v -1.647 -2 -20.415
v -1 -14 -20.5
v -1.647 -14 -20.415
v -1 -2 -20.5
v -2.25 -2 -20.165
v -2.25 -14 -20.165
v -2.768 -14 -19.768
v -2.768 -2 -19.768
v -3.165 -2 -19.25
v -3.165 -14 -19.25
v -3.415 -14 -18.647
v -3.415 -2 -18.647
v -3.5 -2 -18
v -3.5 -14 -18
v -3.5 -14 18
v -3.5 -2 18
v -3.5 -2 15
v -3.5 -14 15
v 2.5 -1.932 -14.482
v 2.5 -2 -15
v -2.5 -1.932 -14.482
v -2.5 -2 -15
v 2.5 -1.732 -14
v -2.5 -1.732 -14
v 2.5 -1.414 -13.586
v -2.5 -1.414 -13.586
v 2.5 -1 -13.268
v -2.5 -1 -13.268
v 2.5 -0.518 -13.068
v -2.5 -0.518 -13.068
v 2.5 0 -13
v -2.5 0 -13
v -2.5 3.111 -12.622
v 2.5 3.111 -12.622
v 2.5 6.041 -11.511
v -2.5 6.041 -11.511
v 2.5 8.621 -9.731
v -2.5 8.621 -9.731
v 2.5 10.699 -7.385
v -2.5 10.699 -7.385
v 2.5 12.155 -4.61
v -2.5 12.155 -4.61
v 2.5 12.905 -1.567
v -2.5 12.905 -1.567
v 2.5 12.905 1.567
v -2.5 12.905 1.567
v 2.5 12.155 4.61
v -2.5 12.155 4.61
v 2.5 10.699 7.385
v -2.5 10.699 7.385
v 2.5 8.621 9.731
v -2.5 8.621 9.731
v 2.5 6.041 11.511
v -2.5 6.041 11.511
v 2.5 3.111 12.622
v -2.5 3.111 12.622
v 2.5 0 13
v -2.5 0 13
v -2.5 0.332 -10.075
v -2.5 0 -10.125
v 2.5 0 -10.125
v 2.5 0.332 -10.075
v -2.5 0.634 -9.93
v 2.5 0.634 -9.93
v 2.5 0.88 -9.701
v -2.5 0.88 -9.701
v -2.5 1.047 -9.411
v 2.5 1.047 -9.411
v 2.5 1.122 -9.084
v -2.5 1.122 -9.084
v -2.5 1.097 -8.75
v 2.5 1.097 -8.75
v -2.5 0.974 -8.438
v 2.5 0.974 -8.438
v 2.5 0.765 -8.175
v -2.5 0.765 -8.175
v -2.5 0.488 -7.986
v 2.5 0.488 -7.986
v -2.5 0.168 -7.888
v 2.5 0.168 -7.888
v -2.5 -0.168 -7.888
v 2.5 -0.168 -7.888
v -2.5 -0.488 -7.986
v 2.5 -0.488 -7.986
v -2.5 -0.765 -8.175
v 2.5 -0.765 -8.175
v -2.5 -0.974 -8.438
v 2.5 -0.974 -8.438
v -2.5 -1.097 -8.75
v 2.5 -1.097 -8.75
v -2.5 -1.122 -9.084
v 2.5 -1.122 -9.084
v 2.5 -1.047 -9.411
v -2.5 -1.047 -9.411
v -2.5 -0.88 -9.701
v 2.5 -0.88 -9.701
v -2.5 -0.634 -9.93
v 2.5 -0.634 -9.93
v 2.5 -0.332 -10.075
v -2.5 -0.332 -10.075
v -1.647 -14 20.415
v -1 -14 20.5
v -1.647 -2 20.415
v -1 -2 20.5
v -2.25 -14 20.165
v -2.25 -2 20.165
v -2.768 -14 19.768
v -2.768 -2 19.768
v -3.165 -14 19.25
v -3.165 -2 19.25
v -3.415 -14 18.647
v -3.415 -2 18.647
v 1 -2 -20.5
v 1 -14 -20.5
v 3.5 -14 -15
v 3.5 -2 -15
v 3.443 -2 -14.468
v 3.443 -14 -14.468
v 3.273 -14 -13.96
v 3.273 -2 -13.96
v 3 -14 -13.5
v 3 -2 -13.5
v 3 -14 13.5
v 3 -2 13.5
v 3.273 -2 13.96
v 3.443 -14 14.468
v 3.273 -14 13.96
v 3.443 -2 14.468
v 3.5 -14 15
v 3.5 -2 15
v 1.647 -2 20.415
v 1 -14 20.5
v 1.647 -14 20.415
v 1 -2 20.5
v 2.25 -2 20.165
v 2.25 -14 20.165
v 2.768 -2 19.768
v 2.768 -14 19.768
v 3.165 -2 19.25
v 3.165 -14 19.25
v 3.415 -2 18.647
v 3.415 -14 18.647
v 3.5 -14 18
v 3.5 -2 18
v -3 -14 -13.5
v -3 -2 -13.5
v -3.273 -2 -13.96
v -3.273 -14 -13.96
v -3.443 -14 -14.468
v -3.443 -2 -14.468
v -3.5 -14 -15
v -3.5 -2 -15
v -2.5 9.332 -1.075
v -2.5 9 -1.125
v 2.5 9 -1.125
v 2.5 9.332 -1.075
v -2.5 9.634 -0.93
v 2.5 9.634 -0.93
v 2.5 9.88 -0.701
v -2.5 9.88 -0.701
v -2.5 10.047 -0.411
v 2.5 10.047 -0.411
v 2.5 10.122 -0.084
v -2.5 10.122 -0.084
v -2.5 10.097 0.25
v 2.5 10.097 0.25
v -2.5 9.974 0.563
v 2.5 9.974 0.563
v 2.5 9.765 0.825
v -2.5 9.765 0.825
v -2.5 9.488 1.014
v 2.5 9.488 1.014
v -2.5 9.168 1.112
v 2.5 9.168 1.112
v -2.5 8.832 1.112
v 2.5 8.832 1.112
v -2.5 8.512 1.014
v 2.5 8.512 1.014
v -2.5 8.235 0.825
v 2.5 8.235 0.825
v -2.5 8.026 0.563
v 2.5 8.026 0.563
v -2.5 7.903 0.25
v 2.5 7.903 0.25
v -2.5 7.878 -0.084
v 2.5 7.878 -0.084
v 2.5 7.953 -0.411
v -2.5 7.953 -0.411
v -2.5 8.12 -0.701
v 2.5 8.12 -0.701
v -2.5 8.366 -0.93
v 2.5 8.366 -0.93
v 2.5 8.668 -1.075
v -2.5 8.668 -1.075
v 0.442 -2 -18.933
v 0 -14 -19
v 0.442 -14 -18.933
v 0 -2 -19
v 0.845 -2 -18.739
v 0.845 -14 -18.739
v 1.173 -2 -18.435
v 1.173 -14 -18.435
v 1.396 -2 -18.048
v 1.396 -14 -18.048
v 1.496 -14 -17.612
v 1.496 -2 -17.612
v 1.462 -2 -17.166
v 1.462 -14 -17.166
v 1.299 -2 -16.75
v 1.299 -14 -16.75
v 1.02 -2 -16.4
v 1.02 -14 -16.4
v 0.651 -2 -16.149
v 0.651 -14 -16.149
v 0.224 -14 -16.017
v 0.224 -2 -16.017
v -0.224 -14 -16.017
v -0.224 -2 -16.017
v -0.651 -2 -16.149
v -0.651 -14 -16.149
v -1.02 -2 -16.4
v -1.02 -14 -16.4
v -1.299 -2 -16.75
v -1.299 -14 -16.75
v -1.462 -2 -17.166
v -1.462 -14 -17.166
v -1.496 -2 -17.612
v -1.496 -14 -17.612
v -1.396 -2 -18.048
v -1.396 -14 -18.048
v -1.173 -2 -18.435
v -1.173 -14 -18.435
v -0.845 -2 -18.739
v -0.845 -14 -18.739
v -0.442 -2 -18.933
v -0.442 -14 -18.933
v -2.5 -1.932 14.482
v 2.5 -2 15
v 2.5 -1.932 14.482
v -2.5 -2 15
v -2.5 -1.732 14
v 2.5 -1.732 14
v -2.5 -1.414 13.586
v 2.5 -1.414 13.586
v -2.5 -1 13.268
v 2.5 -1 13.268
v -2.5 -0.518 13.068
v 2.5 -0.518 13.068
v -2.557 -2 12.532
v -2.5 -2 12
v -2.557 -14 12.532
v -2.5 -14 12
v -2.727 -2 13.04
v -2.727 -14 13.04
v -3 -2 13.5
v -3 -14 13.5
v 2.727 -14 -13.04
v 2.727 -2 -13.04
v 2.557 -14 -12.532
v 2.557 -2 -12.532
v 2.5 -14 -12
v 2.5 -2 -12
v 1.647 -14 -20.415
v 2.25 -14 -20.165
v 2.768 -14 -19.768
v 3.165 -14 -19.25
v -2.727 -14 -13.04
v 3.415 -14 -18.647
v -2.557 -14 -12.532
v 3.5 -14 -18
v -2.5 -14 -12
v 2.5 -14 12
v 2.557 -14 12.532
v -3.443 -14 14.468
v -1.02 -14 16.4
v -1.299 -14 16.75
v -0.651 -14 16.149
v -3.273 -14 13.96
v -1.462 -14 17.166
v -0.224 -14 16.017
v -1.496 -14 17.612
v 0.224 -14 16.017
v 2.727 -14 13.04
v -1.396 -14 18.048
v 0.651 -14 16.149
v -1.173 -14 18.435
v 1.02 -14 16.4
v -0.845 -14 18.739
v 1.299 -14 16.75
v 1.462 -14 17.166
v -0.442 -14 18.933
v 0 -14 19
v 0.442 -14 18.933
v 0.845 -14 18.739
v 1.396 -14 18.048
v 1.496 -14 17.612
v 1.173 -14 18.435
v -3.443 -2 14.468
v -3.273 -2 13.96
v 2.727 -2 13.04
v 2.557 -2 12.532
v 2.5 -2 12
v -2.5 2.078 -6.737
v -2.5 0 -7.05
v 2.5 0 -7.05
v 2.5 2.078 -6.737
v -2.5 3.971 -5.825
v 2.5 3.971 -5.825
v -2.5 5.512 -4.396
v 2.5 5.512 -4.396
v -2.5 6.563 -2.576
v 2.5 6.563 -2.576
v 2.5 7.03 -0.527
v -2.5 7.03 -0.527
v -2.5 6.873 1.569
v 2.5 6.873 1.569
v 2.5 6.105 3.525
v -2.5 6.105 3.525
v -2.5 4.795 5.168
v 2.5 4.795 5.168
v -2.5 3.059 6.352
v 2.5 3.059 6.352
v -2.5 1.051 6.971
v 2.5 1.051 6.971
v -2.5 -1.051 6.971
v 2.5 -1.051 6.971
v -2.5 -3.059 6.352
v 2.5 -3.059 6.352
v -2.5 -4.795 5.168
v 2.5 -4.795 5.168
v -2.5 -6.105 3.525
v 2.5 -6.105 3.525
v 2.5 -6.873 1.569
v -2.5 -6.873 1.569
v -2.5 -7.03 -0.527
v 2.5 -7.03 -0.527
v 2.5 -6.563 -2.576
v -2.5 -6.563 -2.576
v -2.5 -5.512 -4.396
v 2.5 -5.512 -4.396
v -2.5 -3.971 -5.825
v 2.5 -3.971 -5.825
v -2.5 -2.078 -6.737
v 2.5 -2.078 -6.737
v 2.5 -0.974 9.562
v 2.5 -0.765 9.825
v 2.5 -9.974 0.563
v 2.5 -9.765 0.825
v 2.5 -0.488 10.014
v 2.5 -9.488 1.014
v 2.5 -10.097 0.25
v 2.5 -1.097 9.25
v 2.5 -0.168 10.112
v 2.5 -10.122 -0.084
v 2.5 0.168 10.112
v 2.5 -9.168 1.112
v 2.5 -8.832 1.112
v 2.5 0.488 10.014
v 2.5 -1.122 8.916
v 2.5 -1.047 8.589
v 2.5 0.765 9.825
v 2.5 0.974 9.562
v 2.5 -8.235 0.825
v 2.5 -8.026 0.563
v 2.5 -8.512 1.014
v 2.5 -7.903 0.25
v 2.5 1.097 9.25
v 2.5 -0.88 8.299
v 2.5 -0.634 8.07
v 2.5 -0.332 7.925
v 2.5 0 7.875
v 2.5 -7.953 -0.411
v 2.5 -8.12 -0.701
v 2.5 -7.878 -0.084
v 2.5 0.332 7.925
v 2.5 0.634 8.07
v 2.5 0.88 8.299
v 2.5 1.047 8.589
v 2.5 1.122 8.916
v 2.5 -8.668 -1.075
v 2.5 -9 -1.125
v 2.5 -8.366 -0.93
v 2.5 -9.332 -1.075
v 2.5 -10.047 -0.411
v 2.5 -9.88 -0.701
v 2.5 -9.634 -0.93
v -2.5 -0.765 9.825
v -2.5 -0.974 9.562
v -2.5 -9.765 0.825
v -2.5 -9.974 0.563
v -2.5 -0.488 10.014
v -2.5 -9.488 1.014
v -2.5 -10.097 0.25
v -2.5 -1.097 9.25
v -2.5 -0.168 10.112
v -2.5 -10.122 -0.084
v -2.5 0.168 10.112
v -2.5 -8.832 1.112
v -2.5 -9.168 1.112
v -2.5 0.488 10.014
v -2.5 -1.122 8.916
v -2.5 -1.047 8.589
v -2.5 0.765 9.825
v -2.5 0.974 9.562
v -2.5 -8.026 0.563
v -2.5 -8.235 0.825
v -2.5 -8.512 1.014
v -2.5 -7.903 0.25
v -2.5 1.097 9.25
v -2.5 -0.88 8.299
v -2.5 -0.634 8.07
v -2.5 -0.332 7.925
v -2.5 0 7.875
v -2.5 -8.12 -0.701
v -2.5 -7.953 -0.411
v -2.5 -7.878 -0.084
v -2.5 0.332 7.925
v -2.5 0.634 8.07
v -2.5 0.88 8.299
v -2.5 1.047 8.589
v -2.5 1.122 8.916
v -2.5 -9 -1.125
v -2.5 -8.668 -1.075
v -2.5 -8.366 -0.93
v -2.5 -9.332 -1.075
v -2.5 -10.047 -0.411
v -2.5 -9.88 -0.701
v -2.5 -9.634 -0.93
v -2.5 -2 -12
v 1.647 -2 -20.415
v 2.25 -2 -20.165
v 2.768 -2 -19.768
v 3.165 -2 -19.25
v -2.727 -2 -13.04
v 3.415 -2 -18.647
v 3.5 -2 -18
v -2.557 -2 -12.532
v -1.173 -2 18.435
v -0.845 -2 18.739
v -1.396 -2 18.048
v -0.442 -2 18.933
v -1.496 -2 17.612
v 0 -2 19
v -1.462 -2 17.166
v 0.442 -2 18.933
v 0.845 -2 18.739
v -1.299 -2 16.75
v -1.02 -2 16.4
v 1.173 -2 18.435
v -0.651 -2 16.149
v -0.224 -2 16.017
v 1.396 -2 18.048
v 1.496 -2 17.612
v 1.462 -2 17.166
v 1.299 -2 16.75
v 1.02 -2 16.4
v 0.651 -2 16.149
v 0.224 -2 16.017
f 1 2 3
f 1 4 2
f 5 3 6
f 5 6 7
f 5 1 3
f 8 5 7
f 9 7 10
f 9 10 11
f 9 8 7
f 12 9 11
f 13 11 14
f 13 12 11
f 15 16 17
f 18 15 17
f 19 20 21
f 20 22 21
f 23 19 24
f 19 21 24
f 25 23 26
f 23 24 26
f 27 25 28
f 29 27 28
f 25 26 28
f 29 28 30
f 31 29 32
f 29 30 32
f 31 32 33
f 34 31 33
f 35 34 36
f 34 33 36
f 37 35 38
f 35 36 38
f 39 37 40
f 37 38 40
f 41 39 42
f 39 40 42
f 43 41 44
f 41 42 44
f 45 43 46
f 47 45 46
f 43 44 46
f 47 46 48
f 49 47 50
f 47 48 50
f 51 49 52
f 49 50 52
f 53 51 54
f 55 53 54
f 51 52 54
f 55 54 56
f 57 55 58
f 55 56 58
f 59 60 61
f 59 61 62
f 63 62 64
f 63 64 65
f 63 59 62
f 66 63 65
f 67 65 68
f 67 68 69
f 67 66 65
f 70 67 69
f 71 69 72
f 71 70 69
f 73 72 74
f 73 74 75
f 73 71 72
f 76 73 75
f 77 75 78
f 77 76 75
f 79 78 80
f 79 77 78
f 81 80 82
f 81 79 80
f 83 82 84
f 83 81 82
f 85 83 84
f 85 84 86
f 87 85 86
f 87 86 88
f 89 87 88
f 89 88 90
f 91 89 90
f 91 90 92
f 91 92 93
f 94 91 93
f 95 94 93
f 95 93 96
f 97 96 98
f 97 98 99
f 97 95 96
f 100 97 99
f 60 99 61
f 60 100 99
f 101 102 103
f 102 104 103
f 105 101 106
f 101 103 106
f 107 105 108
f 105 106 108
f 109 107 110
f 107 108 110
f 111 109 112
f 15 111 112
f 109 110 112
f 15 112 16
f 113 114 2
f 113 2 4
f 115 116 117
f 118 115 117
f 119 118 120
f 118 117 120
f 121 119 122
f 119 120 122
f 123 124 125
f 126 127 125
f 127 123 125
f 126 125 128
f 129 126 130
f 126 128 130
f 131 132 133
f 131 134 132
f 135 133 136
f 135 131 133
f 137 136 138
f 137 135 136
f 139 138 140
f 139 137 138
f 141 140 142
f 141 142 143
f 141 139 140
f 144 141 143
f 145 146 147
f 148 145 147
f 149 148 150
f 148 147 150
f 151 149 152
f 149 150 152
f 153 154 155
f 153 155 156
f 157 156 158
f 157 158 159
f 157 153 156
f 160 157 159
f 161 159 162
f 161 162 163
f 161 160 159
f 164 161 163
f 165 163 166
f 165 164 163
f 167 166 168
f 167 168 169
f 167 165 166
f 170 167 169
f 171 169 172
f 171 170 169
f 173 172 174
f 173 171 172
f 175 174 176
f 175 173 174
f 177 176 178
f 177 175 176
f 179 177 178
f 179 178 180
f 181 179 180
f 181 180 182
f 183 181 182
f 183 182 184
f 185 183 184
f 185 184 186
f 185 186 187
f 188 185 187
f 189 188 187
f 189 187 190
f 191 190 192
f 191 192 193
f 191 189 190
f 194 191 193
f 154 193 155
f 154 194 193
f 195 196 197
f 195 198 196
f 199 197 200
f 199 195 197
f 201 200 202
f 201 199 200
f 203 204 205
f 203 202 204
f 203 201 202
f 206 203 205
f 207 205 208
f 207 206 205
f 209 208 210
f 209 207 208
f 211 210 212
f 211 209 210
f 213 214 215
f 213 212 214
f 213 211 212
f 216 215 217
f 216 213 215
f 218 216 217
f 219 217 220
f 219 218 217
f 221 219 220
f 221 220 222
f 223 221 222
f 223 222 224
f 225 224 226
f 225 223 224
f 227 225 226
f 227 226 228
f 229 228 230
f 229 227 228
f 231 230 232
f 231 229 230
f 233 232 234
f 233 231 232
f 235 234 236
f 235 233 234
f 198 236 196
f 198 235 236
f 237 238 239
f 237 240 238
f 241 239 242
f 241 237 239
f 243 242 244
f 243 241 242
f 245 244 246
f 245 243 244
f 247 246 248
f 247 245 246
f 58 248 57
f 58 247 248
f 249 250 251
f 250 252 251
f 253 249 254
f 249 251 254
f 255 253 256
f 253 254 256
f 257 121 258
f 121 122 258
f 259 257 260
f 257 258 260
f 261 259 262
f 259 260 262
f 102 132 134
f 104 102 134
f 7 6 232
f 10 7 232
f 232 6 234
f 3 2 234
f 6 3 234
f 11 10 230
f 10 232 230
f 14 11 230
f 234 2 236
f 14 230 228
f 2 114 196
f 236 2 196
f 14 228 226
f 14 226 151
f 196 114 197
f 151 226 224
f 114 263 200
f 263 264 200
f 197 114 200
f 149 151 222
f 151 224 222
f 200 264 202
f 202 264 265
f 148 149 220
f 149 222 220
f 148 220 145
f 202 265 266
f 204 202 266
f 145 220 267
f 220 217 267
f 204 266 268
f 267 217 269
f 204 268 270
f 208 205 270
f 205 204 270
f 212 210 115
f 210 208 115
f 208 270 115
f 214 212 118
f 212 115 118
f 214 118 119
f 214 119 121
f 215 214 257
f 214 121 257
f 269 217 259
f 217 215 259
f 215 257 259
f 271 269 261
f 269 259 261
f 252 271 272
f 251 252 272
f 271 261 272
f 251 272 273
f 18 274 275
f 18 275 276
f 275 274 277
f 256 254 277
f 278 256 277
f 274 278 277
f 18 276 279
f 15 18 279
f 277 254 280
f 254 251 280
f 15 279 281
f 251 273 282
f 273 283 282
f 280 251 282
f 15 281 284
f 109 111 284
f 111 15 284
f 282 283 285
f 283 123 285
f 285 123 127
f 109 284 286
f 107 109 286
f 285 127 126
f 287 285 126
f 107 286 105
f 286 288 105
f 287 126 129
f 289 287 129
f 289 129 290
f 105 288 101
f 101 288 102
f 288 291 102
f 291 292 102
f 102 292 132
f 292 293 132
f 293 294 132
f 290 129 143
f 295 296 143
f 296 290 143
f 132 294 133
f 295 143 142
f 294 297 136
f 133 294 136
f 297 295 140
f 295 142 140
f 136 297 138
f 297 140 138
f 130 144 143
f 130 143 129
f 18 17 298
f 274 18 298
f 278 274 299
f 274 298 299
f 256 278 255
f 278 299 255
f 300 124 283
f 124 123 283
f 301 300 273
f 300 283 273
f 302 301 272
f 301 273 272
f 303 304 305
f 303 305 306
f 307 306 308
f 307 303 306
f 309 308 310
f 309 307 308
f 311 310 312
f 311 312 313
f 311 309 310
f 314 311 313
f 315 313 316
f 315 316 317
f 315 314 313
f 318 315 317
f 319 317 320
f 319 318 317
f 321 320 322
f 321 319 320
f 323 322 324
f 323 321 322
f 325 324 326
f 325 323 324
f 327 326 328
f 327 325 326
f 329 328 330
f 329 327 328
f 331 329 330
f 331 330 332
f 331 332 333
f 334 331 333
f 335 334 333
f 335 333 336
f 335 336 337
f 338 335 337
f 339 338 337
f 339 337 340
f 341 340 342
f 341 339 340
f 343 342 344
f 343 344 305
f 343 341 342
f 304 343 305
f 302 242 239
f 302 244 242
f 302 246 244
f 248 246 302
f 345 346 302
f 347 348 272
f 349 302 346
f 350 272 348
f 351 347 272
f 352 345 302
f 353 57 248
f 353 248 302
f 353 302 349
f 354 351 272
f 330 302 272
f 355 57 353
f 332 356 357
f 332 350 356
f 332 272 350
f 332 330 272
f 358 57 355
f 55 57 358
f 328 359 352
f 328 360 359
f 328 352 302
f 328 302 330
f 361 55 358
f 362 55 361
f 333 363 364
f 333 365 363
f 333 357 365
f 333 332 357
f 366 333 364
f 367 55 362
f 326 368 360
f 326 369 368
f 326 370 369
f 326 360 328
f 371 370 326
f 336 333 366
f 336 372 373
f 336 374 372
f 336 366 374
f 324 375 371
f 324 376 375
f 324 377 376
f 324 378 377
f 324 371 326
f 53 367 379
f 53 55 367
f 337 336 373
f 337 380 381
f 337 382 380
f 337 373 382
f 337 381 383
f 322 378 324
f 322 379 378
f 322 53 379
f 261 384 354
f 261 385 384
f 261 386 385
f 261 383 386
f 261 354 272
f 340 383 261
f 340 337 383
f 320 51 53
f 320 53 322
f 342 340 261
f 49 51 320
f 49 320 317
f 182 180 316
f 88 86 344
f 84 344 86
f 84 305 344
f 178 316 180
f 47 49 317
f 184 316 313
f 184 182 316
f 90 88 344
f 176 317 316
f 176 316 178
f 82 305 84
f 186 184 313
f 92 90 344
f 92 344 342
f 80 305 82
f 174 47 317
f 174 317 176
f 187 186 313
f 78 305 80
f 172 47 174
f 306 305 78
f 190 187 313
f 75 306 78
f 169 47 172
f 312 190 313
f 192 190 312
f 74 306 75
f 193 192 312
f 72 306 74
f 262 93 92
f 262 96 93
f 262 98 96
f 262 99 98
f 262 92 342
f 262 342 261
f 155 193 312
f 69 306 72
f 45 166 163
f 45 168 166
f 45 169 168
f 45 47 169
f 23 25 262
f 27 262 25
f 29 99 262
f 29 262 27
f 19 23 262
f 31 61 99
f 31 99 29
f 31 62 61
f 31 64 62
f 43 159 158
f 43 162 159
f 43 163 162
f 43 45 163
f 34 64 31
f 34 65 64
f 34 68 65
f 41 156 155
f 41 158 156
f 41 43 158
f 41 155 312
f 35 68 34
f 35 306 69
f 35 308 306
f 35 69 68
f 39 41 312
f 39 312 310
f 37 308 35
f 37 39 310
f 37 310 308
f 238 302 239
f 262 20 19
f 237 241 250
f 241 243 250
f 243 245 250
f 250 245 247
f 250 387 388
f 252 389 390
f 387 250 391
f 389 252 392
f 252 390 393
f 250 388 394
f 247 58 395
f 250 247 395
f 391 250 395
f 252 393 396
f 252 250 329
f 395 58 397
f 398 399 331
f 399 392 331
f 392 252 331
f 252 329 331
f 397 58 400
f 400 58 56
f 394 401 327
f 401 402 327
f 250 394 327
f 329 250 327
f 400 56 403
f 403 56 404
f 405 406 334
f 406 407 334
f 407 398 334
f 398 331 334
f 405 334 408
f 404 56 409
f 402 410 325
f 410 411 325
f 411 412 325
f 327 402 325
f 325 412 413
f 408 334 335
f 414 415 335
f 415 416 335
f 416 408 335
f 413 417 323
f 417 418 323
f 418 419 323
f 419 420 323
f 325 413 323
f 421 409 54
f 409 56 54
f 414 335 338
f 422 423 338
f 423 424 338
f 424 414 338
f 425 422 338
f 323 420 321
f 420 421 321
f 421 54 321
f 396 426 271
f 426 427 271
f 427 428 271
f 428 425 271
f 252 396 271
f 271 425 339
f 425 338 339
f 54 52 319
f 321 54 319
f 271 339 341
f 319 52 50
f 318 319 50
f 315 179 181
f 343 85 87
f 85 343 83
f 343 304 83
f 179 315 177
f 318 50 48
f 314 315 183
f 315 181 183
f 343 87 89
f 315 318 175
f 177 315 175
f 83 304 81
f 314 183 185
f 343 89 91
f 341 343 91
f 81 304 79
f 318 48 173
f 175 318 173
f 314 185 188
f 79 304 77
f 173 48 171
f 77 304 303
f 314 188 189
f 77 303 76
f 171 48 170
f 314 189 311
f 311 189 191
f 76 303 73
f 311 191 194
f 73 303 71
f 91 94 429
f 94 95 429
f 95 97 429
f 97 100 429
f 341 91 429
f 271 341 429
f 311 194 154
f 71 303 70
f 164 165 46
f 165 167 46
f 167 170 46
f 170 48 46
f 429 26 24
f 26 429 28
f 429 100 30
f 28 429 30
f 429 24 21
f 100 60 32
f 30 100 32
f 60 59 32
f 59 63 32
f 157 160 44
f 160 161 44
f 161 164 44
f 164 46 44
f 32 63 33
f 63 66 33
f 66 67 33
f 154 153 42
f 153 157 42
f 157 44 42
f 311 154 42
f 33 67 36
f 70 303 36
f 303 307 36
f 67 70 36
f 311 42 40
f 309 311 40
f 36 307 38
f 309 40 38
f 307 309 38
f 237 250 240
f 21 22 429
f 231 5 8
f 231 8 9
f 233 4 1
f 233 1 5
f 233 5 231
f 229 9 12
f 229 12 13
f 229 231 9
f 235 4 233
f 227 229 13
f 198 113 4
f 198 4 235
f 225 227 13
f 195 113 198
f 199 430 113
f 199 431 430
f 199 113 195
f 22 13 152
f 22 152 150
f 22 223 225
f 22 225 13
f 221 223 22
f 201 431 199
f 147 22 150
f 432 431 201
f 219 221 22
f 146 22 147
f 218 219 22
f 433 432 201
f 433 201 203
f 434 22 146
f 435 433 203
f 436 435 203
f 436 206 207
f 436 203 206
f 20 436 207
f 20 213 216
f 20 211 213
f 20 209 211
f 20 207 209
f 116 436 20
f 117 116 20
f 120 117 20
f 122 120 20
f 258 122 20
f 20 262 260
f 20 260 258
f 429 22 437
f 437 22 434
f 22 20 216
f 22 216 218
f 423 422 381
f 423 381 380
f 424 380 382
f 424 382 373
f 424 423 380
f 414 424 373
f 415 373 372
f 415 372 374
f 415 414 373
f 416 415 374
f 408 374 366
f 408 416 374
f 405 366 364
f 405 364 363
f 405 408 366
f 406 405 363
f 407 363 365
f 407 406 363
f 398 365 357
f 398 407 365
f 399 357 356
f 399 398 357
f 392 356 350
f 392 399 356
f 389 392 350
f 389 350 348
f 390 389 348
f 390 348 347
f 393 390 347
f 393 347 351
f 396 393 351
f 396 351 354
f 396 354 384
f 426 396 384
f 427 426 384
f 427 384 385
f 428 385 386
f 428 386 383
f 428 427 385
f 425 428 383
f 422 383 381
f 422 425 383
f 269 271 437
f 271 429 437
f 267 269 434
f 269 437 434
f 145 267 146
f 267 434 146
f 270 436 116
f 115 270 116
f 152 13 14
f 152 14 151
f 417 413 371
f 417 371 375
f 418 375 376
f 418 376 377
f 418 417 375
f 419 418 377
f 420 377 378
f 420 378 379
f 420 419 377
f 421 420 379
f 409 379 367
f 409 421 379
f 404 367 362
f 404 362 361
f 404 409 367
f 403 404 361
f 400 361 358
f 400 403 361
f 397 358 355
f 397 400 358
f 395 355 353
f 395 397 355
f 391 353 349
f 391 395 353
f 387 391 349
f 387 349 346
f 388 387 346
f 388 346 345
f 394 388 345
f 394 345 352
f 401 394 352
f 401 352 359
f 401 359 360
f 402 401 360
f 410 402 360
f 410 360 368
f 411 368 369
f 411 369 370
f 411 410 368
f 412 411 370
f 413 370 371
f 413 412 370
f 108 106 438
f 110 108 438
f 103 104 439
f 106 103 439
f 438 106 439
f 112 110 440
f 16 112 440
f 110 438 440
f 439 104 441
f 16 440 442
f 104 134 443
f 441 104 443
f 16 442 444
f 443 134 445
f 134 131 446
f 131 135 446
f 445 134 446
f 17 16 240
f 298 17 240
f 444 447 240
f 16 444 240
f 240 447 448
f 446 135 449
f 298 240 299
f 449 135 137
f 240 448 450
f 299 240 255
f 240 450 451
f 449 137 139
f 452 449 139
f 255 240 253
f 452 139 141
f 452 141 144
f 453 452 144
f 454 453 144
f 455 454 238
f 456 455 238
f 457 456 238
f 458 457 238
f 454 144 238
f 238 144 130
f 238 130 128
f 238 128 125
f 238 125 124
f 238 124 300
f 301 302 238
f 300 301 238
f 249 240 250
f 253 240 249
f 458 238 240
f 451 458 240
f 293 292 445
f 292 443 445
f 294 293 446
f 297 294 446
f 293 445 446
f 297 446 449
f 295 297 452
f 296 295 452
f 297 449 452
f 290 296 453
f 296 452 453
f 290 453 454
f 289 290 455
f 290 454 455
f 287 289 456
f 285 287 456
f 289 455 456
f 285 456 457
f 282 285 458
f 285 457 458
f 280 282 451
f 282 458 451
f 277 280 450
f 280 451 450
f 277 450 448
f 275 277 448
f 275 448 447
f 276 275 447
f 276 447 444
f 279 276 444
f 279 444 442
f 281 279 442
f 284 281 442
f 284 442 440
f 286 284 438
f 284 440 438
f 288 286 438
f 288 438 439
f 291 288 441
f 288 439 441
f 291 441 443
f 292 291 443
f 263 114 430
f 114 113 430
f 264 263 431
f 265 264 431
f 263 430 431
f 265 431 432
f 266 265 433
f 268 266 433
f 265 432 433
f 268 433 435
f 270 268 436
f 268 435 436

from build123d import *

# Parameters (mm, degrees)
BOSS_EXTRUDE1_DEPTH      = 2.5
BOSS_EXTRUDE1_DEPTH_BACK = 2.5
SKETCH1_R                = 1.125
SKETCH1_R_2              = 7.05
SKETCH2_W                = 7.5
SKETCH2_H                = 12
BOSS_EXTRUDE2_DEPTH      = 3.5
FILLET3_R                = 2.5
FILLET4_R                = 2.5
FILLET5_R                = 2.5
SKETCH5_R                = 1.5
CUT_EXTRUDE1_DEPTH       = 26.64176281
FILLET3_OF_MIRROR1_R     = 2.5
FILLET4_OF_MIRROR1_R     = 2.5
FILLET5_OF_MIRROR1_R     = 2.5
FILLET6_R                = 2


# Some blends are built 0.0001 mm under size
with BuildPart() as part:
    # Sketch1 → Boss-Extrude1 (new, two sides: drawn at the far end of the back side and taken through both)
    with BuildSketch(Plane(origin=(0, 0, 0), x_dir=(0, 0, -1), z_dir=(1, 0, 0)).offset(-BOSS_EXTRUDE1_DEPTH_BACK)):
        with BuildLine():
            Line((-13, 0), (-13, -3))
            Line((-13, -3), (-13, -14))
            Line((-13, -14), (13, -14))
            Line((13, -14), (13, -3))
            Line((13, -3), (13, 0))
            ThreePointArc((13, 0), (0, 13), (-13, 0))
        make_face()
        with Locations((0, 9)):
            Circle(SKETCH1_R, mode=Mode.SUBTRACT)
        with Locations((9, 0)):
            Circle(SKETCH1_R, mode=Mode.SUBTRACT)
        with Locations((0, -9)):
            Circle(SKETCH1_R, mode=Mode.SUBTRACT)
        with Locations((-9, 0)):
            Circle(SKETCH1_R, mode=Mode.SUBTRACT)
        Circle(SKETCH1_R_2, mode=Mode.SUBTRACT)
    extrude(amount=BOSS_EXTRUDE1_DEPTH + BOSS_EXTRUDE1_DEPTH_BACK)

    # Sketch2 → Boss-Extrude2 (add, symmetric)
    with BuildSketch(Plane(origin=(0, 0, 0), x_dir=(0, 0, -1), z_dir=(1, 0, 0))):
        with Locations((-16.75, -8)):
            Rectangle(SKETCH2_W, SKETCH2_H)
    boss_extrude2 = extrude(amount=BOSS_EXTRUDE2_DEPTH, both=True)

    # Fillet3
    fillet3_edges = [part.edges().sort_by_distance(p)[0] for p in [
        (-3.5, -8, 20.5),
        (3.5, -8, 20.5),
    ]]
    fillet(fillet3_edges, radius=FILLET3_R)

    # Fillet4
    # the kernel refuses this fillet: 2.5 mm, written as the material it takes off along each edge
    with BuildSketch(Plane(origin=(-3.5, 3, 13), x_dir=(0, 0, 1), z_dir=(0, -1, 0))) as fillet4_piece_1:
        with BuildLine():
            CenterArc((2, -2.5), FILLET4_R, 90, 53.130102354)
            Line((0, -1), (-0.04, -0.97))
            ThreePointArc((-0.04, -0.97), (-0.05, -0.5), (-0.05, 0))
            Line((-0.05, 0), (0, 0.05))
            Line((0, 0.05), (2, 0.05))
            Line((2, 0.05), (2, 0))
        make_face()
    extrude(amount=22, mode=Mode.SUBTRACT)
    with BuildSketch(Plane(origin=(3.5, 3, 13), x_dir=(-1, 0, 0), z_dir=(0, -1, 0))) as fillet4_piece_2:
        with BuildLine():
            CenterArc((2.5, -2), FILLET4_R, 126.869897646, 53.130102354)
            Line((0, -2), (-0.05, -2))
            Line((-0.05, -2), (-0.05, 0))
            Line((-0.05, 0), (0, 0.05))
            ThreePointArc((0, 0.05), (0.5, 0.05), (0.97, 0.04))
            Line((0.97, 0.04), (1, 0))
        make_face()
    extrude(amount=22, mode=Mode.SUBTRACT)

    # Fillet5
    fillet5_edges = [part.edges().sort_by_distance(p)[0] for p in [
        (2.5, -8, 13),
        (-2.5, -8, 13),
    ]]
    fillet(fillet5_edges, radius=FILLET5_R)

    # Sketch5 → Cut-Extrude1 (cut, symmetric)
    with BuildSketch(Plane(origin=(0, -2, 0), x_dir=(1, 0, 0), z_dir=(0, 1, 0))):
        with Locations(Location((0, -17.5, 0), (0, 0, 270))):
            Circle(SKETCH5_R)
    cut_extrude1 = extrude(amount=CUT_EXTRUDE1_DEPTH, both=True, mode=Mode.SUBTRACT)

    # Mirror1: Boss-Extrude2, Cut-Extrude1 across plane
    add(boss_extrude2.mirror(Plane.XY))
    add(cut_extrude1.mirror(Plane.XY), mode=Mode.SUBTRACT)

    # Fillet3 of Mirror1
    fillet3_of_mirror1_edges = [part.edges().sort_by_distance(p)[0] for p in [
        (-3.5, -8, -20.5),
        (3.5, -8, -20.5),
    ]]
    fillet(fillet3_of_mirror1_edges, radius=FILLET3_OF_MIRROR1_R)

    # Fillet4 of Mirror1
    # the kernel refuses this fillet: 2.5 mm, written as the material it takes off along each edge
    with BuildSketch(Plane(origin=(-3.5, 3, -13), x_dir=(0, 0, -1), z_dir=(0, -1, 0))) as fillet4_of_mirror1_piece_1:
        with BuildLine():
            CenterArc((2, 2.5), FILLET4_OF_MIRROR1_R, 216.869897646, 53.130102354)
            Line((0, 1), (-0.04, 0.97))
            ThreePointArc((-0.04, 0.97), (-0.05, 0.5), (-0.05, 0))
            Line((-0.05, 0), (0, -0.05))
            Line((0, -0.05), (2, -0.05))
            Line((2, -0.05), (2, 0))
        make_face()
    extrude(amount=22, mode=Mode.SUBTRACT)
    with BuildSketch(Plane(origin=(3.5, 3, -13), x_dir=(0, 0, -1), z_dir=(0, -1, 0))) as fillet4_of_mirror1_piece_2:
        with BuildLine():
            CenterArc((2, -2.5), FILLET4_OF_MIRROR1_R, 90, 53.130102354)
            Line((0, -1), (-0.04, -0.97))
            ThreePointArc((-0.04, -0.97), (-0.05, -0.5), (-0.05, 0))
            Line((-0.05, 0), (0, 0.05))
            Line((0, 0.05), (2, 0.05))
            Line((2, 0.05), (2, 0))
        make_face()
    extrude(amount=22, mode=Mode.SUBTRACT)

    # Fillet5 of Mirror1
    fillet5_of_mirror1_edges = [part.edges().sort_by_distance(p)[0] for p in [
        (2.5, -8, -13),
        (-2.5, -8, -13),
    ]]
    fillet(fillet5_of_mirror1_edges, radius=FILLET5_OF_MIRROR1_R)

    # Fillet6
    fillet6_edges = [part.edges().sort_by_distance(p)[0] for p in [
        (0, -2, 13),
        (0, -2, -13),
    ]]
    fillet(fillet6_edges, radius=FILLET6_R - 0.0001)  # a hair under: the kernel refuses the full size


solid = part.part
